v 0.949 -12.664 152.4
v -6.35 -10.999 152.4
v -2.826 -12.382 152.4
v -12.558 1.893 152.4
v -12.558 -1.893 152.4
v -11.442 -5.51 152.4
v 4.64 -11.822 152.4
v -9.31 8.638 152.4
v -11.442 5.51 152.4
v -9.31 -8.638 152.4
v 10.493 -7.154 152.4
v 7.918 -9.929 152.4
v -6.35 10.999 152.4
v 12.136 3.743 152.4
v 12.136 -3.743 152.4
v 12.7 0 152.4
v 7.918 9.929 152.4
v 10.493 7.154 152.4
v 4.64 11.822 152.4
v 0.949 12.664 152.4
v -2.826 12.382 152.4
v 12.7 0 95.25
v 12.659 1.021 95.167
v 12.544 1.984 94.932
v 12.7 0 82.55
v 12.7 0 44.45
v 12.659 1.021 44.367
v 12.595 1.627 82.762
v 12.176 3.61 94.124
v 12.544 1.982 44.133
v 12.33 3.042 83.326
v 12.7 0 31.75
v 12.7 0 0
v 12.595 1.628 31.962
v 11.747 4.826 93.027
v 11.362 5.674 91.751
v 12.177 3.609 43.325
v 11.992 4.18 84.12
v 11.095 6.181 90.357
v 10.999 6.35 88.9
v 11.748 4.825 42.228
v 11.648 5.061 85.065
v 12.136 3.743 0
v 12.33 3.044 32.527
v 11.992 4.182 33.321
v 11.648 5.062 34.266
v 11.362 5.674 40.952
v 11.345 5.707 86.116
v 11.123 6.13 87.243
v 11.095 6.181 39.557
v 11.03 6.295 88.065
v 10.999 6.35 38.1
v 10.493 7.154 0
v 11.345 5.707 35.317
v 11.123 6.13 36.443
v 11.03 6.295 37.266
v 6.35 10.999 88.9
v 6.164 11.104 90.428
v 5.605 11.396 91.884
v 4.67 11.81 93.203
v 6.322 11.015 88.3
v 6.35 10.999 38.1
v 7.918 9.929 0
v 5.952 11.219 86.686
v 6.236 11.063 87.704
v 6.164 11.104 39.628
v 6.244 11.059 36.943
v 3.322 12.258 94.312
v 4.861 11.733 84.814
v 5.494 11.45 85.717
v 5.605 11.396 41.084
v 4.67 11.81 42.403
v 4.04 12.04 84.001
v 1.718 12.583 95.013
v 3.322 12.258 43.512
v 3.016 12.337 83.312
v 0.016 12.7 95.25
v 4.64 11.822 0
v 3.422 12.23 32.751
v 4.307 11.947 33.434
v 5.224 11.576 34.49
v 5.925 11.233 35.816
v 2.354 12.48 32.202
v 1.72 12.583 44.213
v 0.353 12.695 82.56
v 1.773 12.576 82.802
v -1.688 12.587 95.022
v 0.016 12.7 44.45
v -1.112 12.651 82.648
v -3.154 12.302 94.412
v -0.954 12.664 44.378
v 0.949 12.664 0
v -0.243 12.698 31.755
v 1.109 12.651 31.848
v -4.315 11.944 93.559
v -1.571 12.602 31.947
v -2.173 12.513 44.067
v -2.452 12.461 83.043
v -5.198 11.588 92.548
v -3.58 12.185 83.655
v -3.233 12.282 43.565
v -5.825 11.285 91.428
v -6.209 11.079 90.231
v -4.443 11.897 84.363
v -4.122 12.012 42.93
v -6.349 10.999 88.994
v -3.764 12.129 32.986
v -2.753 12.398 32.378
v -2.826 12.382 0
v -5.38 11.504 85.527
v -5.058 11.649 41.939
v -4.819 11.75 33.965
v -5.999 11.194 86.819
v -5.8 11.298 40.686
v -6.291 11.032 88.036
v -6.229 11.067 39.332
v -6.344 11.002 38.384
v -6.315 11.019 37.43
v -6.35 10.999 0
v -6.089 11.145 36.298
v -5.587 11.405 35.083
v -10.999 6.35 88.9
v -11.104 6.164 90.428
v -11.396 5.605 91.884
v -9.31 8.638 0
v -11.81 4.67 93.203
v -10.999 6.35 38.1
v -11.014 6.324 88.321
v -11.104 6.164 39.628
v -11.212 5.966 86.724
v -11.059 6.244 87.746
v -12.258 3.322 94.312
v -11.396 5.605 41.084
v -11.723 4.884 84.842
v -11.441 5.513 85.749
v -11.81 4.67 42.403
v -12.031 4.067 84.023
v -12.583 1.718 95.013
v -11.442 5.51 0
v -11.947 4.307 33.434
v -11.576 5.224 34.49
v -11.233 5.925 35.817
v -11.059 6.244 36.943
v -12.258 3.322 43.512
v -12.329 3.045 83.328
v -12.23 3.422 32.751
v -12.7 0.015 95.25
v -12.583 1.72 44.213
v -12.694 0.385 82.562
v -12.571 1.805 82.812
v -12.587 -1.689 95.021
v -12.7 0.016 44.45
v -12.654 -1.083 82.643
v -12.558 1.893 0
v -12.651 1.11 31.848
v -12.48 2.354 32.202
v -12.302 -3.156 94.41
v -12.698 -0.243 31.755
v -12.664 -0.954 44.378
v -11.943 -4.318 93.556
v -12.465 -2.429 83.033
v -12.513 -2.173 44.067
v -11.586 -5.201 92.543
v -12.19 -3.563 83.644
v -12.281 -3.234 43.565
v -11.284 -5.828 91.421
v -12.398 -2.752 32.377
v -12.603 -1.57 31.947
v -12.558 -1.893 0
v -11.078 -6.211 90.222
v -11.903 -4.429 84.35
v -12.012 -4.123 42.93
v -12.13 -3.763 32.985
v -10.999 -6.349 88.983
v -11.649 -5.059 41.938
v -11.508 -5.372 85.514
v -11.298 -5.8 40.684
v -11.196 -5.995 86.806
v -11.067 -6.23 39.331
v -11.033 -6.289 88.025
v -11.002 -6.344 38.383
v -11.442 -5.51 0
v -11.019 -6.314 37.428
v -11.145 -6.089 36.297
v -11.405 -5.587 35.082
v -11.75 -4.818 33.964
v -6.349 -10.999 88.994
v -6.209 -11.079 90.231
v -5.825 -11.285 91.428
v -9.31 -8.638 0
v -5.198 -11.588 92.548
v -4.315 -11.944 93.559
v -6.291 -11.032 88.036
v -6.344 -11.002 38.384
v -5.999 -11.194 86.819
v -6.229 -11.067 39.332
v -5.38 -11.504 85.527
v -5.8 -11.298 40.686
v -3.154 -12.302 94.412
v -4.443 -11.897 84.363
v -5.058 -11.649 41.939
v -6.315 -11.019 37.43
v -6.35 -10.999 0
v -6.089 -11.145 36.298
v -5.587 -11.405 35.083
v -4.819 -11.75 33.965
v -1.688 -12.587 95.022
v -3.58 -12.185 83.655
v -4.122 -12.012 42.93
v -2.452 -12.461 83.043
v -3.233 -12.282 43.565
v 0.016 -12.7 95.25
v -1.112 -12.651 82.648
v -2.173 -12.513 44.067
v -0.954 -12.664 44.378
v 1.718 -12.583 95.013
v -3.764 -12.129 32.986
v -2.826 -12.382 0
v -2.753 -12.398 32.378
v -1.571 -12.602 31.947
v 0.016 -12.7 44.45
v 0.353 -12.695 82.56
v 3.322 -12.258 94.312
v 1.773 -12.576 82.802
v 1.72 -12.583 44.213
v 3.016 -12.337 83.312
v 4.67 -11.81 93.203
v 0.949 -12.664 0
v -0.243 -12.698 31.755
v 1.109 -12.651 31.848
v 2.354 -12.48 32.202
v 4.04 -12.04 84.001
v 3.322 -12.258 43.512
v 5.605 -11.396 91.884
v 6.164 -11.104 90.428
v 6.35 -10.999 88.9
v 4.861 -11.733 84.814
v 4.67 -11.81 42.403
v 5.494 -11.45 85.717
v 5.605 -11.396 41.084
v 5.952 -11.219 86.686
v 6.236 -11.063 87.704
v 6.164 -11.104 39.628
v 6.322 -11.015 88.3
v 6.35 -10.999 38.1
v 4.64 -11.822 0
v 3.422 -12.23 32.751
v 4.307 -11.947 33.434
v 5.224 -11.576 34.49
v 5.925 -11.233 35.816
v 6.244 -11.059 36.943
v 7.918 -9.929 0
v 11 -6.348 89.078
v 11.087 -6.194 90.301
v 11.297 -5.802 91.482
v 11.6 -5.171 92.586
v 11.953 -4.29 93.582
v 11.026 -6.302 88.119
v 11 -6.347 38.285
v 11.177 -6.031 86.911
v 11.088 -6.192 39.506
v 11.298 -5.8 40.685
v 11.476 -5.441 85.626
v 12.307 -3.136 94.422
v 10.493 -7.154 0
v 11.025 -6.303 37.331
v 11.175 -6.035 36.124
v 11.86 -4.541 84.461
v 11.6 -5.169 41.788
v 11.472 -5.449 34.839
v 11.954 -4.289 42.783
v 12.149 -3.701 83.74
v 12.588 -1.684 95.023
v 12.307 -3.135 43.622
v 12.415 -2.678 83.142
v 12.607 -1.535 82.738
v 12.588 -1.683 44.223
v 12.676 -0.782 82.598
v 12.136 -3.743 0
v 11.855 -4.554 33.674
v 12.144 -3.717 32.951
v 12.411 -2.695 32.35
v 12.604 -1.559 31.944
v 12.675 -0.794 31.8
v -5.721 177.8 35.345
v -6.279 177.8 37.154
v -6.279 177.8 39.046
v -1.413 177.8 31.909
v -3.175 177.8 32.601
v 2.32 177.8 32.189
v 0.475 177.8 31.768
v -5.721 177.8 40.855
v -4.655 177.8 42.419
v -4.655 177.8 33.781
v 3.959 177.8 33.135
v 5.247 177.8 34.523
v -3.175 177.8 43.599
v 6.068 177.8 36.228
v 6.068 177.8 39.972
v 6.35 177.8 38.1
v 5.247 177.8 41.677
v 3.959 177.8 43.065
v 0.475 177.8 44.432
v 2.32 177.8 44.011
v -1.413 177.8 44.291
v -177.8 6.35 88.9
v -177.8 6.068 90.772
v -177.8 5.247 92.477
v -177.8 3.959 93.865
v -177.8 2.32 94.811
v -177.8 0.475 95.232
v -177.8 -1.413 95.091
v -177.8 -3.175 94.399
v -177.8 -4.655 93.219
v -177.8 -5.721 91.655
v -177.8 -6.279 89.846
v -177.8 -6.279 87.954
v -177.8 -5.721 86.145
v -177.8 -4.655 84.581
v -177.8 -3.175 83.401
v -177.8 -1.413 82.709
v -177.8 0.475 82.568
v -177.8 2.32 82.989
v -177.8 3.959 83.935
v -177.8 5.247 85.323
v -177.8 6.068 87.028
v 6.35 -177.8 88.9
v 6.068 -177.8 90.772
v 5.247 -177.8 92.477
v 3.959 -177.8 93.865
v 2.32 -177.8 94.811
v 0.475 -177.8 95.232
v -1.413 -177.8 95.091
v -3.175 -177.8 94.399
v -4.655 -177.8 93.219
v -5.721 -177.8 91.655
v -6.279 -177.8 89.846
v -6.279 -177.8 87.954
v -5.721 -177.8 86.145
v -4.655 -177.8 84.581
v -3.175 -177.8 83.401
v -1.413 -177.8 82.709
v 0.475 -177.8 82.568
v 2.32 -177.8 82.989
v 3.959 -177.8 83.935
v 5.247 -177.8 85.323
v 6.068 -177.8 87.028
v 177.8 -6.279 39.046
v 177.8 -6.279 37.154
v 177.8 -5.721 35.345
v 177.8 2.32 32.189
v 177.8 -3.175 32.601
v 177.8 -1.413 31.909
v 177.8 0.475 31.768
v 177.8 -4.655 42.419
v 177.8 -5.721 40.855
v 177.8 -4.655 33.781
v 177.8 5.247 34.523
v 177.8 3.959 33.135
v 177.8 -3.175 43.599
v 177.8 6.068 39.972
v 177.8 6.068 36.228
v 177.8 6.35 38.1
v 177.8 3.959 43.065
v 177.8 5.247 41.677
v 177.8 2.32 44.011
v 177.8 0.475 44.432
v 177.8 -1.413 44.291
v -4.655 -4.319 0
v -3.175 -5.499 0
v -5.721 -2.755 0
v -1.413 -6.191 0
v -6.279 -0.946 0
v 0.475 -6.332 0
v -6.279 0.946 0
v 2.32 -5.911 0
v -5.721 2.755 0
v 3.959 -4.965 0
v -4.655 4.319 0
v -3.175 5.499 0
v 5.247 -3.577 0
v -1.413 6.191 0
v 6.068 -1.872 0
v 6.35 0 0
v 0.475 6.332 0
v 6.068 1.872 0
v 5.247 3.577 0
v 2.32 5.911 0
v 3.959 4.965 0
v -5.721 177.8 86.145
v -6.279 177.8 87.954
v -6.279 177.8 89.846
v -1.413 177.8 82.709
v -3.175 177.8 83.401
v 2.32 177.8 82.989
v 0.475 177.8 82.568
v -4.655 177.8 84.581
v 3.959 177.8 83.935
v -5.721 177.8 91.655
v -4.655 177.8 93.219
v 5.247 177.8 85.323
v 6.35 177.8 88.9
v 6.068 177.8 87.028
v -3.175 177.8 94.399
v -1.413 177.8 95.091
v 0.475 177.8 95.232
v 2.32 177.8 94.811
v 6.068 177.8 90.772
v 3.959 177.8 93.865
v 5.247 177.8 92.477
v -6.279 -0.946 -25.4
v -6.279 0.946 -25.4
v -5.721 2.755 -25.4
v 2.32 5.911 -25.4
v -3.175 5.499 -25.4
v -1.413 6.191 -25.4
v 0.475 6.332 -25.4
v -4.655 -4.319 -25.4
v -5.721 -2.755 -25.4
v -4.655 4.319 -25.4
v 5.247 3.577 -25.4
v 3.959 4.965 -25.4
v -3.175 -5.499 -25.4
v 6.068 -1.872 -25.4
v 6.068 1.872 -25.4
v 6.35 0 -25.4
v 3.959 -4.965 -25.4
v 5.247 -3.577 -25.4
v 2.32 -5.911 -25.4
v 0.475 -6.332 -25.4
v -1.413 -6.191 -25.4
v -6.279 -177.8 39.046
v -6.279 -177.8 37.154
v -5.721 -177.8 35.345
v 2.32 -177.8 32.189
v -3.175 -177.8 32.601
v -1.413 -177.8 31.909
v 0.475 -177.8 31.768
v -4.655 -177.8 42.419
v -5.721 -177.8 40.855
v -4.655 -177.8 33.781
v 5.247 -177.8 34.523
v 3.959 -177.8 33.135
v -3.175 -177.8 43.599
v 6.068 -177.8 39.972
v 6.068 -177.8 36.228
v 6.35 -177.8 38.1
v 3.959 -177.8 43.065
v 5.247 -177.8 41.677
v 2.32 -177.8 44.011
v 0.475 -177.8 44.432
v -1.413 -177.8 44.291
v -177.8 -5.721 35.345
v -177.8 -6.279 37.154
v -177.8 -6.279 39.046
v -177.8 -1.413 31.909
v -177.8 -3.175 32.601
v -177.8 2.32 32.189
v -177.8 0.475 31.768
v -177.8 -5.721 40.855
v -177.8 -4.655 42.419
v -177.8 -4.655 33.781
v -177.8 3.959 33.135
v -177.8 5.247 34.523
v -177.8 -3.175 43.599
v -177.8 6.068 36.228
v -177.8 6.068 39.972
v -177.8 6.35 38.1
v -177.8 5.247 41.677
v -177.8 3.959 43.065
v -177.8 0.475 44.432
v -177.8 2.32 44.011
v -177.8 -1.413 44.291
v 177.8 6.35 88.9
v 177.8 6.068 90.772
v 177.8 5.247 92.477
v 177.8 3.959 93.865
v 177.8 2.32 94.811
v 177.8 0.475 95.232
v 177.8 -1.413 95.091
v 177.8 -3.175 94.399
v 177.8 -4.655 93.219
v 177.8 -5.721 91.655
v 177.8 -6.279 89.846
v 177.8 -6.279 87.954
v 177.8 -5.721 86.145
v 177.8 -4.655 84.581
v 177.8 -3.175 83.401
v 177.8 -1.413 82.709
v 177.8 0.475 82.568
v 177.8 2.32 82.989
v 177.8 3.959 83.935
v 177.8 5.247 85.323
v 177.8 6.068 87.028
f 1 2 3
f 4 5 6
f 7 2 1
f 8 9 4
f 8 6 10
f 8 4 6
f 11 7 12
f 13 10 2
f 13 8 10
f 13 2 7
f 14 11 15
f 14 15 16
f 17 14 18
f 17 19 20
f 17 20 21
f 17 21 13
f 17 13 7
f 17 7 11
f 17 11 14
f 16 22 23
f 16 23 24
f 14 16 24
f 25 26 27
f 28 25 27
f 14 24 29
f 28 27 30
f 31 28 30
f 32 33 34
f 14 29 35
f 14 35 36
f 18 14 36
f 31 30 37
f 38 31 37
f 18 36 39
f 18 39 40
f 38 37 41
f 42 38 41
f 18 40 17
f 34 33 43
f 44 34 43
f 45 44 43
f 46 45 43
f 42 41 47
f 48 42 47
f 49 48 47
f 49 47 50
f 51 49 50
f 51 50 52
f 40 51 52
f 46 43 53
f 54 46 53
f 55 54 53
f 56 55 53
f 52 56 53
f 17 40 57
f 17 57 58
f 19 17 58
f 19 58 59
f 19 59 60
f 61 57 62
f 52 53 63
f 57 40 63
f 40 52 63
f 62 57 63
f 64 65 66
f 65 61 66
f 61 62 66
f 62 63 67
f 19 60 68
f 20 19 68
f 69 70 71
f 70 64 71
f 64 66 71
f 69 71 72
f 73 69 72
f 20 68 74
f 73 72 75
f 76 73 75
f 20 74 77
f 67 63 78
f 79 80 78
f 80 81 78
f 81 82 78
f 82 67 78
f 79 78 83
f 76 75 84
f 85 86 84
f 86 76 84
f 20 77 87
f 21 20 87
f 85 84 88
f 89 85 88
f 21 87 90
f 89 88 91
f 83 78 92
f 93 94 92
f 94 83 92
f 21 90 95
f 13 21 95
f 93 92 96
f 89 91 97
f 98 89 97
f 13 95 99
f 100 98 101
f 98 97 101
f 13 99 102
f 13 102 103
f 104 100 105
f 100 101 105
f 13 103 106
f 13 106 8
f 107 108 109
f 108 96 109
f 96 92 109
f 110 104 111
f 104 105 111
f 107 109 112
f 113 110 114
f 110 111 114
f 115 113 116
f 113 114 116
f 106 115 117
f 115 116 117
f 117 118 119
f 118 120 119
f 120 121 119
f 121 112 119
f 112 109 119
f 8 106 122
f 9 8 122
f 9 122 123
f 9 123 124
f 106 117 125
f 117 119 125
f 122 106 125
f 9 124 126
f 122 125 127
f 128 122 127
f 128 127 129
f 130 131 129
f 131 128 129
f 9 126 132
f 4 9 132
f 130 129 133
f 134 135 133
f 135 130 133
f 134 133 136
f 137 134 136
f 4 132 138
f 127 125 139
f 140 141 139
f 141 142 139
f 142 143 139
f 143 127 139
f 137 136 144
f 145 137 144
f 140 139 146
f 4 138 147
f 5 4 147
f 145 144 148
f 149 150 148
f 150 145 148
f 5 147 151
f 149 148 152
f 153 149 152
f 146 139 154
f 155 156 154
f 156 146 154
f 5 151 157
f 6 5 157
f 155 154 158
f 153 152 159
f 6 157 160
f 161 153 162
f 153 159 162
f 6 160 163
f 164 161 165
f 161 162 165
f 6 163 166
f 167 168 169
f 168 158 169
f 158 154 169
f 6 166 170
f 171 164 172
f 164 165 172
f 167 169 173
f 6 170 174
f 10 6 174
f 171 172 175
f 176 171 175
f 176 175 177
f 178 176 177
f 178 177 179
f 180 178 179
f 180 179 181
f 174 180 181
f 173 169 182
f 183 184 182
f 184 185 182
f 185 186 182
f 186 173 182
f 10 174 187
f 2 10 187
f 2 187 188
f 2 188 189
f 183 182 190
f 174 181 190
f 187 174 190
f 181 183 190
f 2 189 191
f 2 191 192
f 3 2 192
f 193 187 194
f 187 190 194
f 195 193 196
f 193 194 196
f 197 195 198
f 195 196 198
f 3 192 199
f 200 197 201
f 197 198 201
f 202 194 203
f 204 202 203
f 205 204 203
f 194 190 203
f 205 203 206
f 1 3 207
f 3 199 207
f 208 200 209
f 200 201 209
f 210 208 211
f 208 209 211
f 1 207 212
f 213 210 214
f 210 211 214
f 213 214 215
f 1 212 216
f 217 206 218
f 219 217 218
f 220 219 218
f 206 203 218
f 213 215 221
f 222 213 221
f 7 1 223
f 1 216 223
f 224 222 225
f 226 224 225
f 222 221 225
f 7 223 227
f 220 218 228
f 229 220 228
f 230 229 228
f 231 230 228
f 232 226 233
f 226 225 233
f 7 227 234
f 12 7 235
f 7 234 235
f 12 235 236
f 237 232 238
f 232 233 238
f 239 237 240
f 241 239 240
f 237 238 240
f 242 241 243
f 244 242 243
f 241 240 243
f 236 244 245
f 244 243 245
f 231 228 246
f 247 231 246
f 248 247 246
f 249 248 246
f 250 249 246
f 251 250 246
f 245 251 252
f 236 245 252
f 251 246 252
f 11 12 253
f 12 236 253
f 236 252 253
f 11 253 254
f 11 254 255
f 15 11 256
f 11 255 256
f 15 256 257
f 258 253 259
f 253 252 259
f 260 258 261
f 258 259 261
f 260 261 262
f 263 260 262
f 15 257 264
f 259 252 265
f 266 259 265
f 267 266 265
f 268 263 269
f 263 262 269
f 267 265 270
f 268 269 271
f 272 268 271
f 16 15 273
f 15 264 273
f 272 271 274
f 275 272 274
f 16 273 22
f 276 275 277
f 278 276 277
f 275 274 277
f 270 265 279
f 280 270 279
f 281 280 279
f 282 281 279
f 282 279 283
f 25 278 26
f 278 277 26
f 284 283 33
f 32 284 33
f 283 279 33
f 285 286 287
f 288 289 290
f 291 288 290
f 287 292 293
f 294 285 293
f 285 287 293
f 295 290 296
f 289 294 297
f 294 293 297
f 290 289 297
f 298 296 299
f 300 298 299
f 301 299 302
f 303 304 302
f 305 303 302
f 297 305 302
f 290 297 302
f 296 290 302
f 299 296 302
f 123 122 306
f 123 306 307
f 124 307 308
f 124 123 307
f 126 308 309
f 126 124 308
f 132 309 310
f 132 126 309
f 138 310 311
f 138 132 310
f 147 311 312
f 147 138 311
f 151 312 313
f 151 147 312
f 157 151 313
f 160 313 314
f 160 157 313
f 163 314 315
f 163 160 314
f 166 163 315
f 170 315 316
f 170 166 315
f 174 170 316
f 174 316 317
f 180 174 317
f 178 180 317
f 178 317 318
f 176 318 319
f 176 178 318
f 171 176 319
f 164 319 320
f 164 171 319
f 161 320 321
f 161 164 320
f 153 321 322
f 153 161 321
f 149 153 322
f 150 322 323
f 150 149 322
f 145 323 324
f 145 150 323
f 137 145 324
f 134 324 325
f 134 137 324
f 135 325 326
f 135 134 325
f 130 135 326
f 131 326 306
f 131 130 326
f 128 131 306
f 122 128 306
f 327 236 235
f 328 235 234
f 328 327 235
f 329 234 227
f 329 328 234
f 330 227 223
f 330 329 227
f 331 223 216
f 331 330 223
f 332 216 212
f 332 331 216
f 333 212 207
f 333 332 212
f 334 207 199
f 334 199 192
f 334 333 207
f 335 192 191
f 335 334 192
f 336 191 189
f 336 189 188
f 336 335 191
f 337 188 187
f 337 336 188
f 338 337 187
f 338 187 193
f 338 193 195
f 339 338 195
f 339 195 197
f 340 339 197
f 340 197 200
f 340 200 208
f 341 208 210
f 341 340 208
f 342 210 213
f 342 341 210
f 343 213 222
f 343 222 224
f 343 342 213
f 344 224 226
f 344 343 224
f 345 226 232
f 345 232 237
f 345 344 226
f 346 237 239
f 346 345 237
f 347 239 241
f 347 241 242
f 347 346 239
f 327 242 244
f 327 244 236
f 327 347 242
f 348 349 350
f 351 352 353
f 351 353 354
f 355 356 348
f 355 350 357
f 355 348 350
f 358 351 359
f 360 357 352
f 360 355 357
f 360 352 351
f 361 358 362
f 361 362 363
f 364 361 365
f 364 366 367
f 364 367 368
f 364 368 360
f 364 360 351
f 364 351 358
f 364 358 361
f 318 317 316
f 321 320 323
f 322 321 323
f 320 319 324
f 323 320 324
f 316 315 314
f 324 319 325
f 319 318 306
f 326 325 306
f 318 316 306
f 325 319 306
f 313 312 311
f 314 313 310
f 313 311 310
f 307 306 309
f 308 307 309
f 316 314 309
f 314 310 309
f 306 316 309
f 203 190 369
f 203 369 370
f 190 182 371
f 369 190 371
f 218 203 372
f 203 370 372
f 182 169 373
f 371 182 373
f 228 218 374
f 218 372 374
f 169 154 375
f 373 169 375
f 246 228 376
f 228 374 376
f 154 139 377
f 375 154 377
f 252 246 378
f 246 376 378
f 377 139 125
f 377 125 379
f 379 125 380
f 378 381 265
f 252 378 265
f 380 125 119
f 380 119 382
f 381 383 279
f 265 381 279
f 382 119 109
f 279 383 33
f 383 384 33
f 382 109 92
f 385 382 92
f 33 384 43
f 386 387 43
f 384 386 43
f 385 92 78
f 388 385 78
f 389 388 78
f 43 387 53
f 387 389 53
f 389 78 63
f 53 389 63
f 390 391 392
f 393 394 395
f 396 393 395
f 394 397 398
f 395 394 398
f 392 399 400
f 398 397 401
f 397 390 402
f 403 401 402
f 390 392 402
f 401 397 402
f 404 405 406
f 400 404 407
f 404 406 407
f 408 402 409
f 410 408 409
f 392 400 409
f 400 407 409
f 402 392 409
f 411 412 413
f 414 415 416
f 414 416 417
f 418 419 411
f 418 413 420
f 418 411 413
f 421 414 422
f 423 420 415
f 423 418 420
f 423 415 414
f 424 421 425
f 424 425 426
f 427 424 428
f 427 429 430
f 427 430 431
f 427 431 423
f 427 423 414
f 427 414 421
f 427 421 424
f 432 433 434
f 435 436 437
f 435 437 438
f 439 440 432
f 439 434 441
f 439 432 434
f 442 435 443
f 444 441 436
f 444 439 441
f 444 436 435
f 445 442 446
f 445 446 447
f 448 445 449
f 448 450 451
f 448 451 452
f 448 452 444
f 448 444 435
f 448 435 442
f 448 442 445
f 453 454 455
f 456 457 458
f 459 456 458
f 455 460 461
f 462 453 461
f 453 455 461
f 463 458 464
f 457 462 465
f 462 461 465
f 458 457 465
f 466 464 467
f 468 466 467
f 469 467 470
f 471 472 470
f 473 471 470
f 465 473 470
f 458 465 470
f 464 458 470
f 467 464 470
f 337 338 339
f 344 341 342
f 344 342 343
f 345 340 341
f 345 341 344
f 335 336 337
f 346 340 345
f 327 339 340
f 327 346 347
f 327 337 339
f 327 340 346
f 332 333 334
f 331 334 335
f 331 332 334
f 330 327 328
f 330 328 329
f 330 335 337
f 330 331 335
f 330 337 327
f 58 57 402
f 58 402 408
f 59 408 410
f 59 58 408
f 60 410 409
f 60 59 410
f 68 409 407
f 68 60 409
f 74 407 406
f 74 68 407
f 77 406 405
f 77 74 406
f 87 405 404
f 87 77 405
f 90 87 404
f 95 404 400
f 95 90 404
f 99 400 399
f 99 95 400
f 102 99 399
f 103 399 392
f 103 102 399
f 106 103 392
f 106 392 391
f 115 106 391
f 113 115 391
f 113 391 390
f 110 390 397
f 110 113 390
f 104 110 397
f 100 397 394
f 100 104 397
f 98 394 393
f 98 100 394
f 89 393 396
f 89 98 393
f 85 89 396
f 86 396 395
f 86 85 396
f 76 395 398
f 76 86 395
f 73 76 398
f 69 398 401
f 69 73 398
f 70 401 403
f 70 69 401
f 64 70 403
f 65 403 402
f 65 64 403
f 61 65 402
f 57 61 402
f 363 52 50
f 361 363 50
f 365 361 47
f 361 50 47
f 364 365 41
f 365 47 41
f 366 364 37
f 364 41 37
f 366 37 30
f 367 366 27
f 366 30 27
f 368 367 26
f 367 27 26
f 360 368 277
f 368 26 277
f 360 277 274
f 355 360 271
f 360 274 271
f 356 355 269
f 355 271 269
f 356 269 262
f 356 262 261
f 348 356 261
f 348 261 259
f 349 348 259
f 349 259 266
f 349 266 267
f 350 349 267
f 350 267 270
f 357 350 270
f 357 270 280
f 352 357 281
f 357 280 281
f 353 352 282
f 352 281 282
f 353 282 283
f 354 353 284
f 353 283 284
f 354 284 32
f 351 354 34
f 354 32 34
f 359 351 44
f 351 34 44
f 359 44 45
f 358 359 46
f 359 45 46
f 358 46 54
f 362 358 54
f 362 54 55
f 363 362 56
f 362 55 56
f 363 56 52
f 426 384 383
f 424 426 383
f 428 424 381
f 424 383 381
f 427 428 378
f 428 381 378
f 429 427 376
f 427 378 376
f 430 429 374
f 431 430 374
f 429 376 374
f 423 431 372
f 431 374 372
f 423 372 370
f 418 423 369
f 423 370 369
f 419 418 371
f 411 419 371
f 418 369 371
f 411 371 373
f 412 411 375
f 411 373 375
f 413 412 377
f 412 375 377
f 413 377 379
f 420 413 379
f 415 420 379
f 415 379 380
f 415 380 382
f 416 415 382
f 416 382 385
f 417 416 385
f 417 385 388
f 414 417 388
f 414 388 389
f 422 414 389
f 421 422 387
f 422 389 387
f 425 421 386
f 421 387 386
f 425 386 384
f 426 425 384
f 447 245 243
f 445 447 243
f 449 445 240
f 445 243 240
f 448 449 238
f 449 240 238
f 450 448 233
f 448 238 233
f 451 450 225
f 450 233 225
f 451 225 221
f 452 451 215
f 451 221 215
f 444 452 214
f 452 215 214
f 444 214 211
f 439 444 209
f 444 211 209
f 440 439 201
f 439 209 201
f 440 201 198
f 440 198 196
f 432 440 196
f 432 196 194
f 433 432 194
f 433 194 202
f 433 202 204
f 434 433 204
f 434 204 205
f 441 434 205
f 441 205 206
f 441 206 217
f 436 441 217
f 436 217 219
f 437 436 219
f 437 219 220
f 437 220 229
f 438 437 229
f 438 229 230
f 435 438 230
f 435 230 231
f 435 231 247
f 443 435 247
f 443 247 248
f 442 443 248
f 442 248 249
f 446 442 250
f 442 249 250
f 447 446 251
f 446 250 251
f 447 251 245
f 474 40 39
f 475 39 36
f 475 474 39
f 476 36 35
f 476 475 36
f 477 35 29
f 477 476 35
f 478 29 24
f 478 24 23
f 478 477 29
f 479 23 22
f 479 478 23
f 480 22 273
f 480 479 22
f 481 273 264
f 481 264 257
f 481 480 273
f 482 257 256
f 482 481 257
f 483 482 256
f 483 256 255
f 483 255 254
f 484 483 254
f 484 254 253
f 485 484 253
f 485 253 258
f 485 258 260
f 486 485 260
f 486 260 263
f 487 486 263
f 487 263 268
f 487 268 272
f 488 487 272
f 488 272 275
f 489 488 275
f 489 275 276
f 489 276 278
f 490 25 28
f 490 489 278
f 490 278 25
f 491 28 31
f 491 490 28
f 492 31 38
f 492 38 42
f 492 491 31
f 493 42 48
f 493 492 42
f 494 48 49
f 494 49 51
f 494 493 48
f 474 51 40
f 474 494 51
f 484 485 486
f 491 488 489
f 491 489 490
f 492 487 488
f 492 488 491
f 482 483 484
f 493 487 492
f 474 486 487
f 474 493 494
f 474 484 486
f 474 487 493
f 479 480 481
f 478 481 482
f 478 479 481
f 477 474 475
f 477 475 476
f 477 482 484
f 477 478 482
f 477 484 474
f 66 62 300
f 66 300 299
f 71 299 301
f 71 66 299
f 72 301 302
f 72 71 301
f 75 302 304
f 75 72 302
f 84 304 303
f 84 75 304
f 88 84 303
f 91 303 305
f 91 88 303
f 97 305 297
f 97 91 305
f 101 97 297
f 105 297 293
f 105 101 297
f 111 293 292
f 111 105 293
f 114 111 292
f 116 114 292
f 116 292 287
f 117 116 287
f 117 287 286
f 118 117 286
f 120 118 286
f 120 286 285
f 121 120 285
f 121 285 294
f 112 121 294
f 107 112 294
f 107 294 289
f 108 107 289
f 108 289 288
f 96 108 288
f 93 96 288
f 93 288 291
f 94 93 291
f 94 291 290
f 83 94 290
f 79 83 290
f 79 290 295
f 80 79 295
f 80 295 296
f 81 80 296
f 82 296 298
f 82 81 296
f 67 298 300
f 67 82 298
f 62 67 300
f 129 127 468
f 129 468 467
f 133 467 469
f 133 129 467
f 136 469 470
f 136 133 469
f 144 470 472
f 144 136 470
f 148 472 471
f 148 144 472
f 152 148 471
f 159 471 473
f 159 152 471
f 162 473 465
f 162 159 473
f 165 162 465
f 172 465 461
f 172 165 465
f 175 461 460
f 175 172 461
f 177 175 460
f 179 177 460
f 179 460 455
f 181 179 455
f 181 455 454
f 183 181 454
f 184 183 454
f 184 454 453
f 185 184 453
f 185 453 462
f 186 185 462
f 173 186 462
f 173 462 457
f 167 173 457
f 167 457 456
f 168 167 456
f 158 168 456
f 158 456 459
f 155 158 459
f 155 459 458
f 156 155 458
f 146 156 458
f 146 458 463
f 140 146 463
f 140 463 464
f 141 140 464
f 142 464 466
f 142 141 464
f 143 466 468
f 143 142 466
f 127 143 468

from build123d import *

# Parameters (mm, degrees)
F0_R     = 12.7
F1_DEPTH = 152.4
F2_R     = 6.35
F3_DEPTH = 25.4
F5_R     = 6.35
F4_R     = 6.35
F6_DEPTH = 177.8
F7_R     = 6.35
F8_DEPTH = 177.8


with BuildPart() as f1:
    # F0 (on Top) → F1 (new body)
    with BuildSketch(Plane.XY):
        Circle(F0_R)
    extrude(amount=F1_DEPTH)

    # F2 (on face) → F3 (join)
    with BuildSketch(Plane(origin=(0, 0, 0), x_dir=(1, 0, 0), z_dir=(0, 0, -1))):
        Circle(F2_R)
    extrude(amount=F3_DEPTH)

    # F5 (on Front) + F4 (on Front) → F6 (join, symmetric)
    with BuildSketch(Plane.XZ):
        with Locations((0, 38.1)):
            Circle(F5_R)
    with BuildSketch(Plane.XZ):
        with Locations((0, 88.9)):
            Circle(F4_R)
    extrude(amount=F6_DEPTH, both=True)

    # F7 (on Right) → F8 (join, symmetric)
    with BuildSketch(Plane.YZ):
        with Locations((0, 38.1)):
            Circle(F7_R)
        with Locations((0, 88.9)):
            Circle(F7_R)
    extrude(amount=F8_DEPTH, both=True)


solid = f1.part
